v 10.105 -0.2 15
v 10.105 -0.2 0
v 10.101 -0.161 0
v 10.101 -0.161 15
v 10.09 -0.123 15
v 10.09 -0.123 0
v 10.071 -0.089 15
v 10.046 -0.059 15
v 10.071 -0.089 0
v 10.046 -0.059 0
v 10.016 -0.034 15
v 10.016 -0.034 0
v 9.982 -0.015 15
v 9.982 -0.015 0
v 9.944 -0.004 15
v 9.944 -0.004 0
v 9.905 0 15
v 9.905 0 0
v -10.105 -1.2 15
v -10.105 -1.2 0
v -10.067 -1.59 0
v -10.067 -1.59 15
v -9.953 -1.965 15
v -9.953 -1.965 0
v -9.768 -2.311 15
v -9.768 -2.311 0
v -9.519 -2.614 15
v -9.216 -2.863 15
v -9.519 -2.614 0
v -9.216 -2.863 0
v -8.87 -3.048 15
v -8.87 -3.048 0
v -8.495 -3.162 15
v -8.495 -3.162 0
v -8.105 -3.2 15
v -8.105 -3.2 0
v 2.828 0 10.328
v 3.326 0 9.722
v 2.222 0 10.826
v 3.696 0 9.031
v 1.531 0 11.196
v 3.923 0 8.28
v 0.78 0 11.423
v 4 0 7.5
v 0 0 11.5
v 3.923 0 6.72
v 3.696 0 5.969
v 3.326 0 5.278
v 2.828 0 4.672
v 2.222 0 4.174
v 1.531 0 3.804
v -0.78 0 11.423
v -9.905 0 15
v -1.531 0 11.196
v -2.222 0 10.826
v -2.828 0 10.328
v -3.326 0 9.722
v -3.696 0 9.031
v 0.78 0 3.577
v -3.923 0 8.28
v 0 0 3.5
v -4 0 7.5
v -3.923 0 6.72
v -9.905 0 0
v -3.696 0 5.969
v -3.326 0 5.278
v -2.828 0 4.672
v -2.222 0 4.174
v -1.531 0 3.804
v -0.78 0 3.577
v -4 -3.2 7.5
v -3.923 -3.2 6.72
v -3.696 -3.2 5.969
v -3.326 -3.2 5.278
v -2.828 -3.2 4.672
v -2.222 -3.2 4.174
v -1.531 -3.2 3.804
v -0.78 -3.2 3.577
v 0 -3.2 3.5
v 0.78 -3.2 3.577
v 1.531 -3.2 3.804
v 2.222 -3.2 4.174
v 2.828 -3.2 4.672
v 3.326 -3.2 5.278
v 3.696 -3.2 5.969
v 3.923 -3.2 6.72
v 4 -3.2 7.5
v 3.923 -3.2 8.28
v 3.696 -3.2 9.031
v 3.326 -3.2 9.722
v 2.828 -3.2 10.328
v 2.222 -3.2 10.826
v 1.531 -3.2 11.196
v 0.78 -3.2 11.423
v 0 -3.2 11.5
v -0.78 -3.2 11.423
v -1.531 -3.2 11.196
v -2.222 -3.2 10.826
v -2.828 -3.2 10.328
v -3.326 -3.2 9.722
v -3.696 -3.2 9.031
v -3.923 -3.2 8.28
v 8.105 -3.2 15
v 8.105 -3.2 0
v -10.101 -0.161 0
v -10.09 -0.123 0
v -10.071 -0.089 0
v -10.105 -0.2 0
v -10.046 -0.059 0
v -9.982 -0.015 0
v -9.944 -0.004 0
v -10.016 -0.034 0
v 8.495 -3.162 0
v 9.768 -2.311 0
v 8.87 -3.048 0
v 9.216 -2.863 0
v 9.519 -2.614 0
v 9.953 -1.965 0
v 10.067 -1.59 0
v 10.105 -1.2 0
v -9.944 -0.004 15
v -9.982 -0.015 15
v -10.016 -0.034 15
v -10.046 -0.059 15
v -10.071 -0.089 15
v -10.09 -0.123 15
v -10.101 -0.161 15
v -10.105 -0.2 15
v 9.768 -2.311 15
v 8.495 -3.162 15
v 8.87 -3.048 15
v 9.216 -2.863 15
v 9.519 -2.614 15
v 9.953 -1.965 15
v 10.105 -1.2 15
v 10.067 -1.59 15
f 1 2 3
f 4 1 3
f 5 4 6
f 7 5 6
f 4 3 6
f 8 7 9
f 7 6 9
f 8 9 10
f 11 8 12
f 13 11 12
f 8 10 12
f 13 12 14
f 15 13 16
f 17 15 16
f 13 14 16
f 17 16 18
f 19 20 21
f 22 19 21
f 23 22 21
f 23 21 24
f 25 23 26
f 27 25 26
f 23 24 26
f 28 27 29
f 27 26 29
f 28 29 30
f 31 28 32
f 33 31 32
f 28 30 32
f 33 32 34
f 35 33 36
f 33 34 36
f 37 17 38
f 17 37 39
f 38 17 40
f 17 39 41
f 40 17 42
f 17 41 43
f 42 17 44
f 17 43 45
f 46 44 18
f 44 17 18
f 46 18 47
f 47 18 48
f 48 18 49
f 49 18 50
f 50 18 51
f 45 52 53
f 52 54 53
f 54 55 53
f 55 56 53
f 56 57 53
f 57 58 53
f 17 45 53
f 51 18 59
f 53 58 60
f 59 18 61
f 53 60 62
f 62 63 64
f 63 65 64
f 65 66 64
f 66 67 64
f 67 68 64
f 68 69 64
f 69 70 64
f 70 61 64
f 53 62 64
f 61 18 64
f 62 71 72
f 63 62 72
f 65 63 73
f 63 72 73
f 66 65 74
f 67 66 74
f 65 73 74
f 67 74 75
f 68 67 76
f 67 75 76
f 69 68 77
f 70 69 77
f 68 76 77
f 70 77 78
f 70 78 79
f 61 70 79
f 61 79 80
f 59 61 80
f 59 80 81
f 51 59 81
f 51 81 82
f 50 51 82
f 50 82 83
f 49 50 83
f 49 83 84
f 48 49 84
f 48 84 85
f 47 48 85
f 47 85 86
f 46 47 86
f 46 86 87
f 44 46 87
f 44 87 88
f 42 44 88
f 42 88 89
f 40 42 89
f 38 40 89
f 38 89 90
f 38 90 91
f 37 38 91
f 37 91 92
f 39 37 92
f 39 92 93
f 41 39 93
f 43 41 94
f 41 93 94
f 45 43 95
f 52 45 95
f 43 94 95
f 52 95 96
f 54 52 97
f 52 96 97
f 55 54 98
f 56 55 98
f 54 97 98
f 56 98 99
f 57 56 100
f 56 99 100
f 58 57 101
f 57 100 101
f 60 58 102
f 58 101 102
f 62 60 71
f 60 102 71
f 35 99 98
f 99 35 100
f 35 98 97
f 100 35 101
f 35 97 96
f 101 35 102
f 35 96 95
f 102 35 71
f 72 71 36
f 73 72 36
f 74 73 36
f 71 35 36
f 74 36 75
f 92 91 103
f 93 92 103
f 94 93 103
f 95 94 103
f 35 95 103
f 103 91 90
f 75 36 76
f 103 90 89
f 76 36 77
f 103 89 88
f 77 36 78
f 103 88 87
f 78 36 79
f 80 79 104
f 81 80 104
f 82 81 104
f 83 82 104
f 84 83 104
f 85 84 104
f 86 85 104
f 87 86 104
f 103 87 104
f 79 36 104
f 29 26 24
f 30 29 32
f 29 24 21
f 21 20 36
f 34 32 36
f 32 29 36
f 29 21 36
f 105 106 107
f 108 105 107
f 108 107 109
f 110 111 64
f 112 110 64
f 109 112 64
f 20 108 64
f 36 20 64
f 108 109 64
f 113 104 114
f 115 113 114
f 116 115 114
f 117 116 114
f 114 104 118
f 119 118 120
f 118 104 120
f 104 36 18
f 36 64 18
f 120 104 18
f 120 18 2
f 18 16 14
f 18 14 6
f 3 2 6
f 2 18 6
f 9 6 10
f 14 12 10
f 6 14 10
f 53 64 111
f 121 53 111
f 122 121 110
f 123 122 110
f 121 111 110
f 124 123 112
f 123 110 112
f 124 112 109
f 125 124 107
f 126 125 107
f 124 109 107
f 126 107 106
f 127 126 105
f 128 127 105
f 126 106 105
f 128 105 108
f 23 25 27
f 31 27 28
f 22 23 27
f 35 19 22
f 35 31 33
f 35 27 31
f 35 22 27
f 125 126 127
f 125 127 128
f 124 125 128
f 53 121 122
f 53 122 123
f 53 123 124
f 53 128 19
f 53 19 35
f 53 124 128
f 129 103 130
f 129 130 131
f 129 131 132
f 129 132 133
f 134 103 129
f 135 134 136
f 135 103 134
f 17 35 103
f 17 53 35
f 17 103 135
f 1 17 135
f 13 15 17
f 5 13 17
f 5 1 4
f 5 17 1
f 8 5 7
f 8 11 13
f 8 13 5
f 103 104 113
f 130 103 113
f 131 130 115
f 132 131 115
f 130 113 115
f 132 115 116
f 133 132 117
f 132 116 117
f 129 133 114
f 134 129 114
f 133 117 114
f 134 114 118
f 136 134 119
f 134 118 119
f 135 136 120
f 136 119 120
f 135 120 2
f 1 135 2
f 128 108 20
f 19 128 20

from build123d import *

# Parameters (mm, degrees)
BOSS_EXTRUDE1_DEPTH   = 15
F_8_0MM_DOWEL_HOLE1_D = 8


with BuildPart() as part:
    # Sketch1 → Boss-Extrude1 (new body)
    with BuildSketch(Plane.XY):
        with BuildLine():
            Line((9.905, 0), (-9.905, 0))
            ThreePointArc((-9.905, 0), (-10.046421356, -0.058578644), (-10.105, -0.2))
            Line((-10.105, -0.2), (-10.105, -1.2))
            ThreePointArc((-10.105, -1.2), (-9.519213562, -2.614213562), (-8.105, -3.2))
            Line((-8.105, -3.2), (8.105, -3.2))
            ThreePointArc((8.105, -3.2), (9.519213562, -2.614213562), (10.105, -1.2))
            Line((10.105, -1.2), (10.105, -0.2))
            ThreePointArc((10.105, -0.2), (10.046421356, -0.058578644), (9.905, 0))
        make_face()
    extrude(amount=BOSS_EXTRUDE1_DEPTH)

    # Ø8.0mm Dowel Hole1 (through all)
    with Locations(Plane(origin=(0, 0, 0), x_dir=(1, 0, 0), z_dir=(0, 1, 0))):
        with Locations((0, -7.5)):
            Hole(F_8_0MM_DOWEL_HOLE1_D / 2)


solid = part.part
